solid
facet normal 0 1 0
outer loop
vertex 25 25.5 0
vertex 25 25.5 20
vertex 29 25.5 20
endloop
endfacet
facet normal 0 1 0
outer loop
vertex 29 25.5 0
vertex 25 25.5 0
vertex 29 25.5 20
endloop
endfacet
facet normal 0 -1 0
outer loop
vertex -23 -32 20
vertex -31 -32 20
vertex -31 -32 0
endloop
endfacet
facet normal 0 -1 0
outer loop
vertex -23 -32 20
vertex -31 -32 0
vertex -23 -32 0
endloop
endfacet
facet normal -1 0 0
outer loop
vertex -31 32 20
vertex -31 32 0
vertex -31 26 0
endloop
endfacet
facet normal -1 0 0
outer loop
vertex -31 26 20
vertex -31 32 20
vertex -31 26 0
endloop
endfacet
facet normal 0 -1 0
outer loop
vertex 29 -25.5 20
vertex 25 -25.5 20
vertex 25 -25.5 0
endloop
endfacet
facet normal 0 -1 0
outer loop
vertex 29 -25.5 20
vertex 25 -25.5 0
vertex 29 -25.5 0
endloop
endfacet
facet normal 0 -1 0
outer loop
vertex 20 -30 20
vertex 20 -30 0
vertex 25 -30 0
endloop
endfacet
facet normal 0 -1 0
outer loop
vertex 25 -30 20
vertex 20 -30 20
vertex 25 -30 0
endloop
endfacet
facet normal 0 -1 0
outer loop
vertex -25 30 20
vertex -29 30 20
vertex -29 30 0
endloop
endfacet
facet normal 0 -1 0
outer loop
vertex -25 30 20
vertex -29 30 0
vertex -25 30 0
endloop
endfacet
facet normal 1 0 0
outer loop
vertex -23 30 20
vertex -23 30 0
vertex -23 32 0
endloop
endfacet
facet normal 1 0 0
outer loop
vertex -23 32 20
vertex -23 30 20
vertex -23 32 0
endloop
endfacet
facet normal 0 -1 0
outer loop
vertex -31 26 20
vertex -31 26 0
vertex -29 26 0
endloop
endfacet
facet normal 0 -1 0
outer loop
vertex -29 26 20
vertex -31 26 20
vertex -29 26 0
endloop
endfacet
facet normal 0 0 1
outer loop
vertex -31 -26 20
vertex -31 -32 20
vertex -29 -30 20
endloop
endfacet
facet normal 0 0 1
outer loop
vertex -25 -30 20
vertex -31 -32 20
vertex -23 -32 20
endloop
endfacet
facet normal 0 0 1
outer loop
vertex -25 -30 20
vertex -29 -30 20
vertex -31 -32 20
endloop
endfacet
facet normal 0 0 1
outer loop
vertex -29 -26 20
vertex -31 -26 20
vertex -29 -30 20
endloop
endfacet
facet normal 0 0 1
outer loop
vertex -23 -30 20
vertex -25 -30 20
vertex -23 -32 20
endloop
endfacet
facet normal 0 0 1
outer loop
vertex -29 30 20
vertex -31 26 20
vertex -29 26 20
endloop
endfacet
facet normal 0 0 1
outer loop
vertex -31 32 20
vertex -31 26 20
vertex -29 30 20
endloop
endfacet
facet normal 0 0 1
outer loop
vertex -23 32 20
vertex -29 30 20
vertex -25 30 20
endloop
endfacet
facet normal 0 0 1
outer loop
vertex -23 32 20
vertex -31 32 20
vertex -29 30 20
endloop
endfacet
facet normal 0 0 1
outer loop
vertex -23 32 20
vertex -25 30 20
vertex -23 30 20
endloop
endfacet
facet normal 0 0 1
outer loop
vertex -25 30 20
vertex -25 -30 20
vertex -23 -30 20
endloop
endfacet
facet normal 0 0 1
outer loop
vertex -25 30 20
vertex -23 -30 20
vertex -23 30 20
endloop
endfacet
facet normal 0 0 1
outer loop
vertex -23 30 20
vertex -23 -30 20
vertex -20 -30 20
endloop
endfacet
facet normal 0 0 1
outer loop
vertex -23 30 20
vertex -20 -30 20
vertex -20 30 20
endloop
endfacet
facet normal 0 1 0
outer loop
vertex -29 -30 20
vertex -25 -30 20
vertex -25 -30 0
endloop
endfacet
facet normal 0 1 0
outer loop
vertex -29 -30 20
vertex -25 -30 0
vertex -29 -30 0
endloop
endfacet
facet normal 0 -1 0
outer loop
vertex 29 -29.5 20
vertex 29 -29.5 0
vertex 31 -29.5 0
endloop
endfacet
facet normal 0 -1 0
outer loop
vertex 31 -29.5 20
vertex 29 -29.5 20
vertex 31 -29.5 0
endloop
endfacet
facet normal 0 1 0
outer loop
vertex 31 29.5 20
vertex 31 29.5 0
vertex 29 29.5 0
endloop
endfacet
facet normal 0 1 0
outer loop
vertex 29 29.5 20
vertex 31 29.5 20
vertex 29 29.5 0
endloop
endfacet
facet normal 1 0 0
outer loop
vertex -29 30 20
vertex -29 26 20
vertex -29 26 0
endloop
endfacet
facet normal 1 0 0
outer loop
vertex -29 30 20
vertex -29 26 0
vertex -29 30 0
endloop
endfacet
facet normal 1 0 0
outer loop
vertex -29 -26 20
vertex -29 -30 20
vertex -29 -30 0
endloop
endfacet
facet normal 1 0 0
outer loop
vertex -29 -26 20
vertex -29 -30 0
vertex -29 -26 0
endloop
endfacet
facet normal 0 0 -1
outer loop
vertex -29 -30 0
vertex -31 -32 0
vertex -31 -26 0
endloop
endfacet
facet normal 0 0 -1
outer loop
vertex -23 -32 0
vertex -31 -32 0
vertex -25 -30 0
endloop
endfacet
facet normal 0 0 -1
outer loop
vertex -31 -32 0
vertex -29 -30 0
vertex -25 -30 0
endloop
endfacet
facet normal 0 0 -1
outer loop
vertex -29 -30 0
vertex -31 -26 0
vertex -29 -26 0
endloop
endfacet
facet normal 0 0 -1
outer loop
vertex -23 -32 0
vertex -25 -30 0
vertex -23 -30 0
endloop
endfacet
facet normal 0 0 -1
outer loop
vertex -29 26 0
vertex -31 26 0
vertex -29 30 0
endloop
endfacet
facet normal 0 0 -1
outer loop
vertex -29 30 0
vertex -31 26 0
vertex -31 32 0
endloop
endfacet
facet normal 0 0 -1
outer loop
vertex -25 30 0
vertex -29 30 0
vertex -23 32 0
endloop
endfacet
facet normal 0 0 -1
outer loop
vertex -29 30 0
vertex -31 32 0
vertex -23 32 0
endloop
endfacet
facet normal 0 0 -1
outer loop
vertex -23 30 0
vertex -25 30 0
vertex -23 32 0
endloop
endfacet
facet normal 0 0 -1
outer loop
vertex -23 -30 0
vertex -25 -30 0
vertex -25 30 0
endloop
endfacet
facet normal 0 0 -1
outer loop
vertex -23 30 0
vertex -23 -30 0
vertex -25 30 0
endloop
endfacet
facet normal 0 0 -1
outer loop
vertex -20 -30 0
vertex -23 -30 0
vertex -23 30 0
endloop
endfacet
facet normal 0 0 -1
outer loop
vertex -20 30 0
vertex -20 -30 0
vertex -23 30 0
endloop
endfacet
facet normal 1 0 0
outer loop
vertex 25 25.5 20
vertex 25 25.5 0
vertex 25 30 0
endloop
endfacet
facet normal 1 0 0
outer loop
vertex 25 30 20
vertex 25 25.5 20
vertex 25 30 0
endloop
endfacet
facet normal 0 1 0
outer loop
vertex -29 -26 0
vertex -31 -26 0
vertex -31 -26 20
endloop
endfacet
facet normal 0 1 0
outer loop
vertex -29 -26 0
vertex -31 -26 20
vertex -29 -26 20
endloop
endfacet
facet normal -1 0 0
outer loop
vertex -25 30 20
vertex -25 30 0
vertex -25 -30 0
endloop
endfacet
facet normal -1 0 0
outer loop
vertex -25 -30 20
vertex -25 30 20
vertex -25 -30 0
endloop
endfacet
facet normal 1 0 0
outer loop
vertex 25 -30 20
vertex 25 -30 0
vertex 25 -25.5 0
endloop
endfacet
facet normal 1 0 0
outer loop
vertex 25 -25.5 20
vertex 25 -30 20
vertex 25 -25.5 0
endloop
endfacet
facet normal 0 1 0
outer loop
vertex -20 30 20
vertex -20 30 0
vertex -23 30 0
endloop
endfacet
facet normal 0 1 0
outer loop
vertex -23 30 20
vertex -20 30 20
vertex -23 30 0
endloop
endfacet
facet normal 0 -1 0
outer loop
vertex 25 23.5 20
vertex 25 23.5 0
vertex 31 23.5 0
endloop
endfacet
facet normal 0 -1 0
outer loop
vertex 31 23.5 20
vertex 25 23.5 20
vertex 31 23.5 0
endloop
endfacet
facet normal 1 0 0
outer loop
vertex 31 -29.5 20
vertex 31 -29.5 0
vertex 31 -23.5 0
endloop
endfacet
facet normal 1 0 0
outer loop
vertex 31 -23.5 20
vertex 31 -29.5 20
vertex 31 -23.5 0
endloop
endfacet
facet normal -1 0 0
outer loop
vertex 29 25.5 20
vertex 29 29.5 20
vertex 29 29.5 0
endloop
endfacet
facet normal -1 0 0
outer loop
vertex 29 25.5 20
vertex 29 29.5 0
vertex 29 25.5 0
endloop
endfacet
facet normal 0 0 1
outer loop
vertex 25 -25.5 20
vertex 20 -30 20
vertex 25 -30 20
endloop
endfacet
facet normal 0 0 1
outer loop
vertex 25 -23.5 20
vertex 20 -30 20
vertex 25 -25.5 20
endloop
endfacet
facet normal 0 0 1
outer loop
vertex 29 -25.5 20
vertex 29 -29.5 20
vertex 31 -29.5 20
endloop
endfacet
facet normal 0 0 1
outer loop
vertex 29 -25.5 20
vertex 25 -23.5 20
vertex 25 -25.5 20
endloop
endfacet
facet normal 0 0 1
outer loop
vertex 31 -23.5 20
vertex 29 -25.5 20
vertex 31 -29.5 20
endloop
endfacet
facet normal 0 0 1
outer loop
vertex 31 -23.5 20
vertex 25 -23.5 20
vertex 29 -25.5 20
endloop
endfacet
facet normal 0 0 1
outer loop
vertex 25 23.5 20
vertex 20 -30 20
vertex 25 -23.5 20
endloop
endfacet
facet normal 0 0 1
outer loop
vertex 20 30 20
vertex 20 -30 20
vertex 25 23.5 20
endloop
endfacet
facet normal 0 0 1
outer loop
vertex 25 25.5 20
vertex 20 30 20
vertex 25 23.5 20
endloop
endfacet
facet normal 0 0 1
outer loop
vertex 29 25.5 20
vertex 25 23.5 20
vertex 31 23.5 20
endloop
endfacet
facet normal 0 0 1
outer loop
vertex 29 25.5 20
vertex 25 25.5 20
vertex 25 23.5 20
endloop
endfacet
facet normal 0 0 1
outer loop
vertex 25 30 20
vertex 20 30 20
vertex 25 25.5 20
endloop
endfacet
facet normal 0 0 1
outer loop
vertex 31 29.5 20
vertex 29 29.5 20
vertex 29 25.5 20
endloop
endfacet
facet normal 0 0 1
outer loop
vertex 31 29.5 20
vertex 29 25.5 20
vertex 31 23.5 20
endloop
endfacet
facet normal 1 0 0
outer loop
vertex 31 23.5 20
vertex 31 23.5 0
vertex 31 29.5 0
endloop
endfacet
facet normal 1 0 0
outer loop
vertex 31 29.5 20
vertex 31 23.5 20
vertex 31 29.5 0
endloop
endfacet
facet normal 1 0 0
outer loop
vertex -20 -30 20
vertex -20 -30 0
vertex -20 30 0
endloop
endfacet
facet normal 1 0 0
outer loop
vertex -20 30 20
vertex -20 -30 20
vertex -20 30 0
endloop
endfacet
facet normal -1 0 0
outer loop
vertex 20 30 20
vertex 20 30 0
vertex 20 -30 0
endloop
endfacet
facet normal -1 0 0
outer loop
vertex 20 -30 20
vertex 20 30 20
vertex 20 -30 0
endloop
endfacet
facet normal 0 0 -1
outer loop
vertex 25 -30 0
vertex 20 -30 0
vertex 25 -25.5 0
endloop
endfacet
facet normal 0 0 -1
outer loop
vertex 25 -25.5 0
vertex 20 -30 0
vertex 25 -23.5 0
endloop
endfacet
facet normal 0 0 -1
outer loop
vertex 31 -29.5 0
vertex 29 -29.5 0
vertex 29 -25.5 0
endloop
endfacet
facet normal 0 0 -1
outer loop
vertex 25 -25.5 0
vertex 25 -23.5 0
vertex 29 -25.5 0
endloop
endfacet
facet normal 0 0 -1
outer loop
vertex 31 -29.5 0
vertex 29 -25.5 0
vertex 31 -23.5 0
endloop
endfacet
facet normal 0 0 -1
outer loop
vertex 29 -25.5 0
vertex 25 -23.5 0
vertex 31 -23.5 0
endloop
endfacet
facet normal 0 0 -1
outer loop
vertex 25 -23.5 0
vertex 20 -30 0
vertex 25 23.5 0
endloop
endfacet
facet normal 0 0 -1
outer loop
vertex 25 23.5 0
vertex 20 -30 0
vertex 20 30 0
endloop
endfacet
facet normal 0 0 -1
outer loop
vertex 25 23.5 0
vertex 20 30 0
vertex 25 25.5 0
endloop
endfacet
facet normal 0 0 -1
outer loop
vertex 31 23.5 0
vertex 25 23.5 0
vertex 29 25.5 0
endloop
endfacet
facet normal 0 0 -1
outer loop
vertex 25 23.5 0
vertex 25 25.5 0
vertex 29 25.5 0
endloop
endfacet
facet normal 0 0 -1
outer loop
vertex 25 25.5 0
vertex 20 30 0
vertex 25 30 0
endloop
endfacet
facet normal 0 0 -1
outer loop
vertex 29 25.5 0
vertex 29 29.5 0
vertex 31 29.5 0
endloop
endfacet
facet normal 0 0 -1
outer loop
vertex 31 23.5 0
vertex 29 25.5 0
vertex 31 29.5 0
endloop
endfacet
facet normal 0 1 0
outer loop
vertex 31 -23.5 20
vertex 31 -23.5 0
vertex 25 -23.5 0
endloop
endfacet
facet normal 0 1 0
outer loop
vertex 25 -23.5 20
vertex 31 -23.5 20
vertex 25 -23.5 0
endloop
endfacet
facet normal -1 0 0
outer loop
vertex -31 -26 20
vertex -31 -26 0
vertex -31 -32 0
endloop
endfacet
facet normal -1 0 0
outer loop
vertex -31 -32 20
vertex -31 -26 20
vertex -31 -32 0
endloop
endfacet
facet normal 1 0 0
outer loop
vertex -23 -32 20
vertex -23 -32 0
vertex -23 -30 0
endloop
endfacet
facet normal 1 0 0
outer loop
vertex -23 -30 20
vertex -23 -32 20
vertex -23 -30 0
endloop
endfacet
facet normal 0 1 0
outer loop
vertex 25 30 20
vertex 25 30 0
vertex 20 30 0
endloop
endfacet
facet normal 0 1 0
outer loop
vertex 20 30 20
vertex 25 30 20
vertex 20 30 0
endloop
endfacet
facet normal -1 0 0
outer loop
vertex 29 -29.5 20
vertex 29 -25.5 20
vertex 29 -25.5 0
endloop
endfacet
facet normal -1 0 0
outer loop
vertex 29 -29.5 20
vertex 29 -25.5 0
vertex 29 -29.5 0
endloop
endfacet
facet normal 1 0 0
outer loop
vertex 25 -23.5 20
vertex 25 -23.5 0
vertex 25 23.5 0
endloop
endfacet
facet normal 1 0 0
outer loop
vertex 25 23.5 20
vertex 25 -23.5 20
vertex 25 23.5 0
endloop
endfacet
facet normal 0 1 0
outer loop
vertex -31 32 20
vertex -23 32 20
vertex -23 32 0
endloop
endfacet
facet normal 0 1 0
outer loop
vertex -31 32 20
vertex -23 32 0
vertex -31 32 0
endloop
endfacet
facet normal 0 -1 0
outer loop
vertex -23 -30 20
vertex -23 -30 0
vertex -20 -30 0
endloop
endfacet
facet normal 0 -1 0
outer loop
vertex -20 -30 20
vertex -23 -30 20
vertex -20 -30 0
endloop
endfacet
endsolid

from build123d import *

# Parameters (mm, degrees)
F0_W     = 5
F0_H     = 47
F0_W_2   = 2
F0_H_2   = 4
F0_H_3   = 2
F1_DEPTH = 20
F0_W_3   = 4


with BuildPart() as f1:
    # F0 (on Top) → F1 (new body)
    with BuildSketch(Plane.XY):
        Polygon((-29, 30), (-25, 30), (-23, 30), (-23, 32), (-29, 32), align=None)
        Polygon((-23, 30), (-25, 30), (-25, 23.5), (-20, 23.5), (-20, 30), align=None)
        with Locations((-22.5, 0)):
            Rectangle(F0_W, F0_H)
        with Locations((-30, 28)):
            Rectangle(F0_W_2, F0_H_2)
        with Locations((-30, 31)):
            Rectangle(F0_W_2, F0_H_3)
        Polygon((-20, -23.5), (-25, -23.5), (-25, -30), (-23, -30), (-20, -30), align=None)
        Polygon((-23, -30), (-25, -30), (-29, -30), (-29, -32), (-23, -32), align=None)
        with Locations((-30, -31)):
            Rectangle(F0_W_2, F0_H_3)
        with Locations((-30, -28)):
            Rectangle(F0_W_2, F0_H_2)
    extrude(amount=F1_DEPTH)


with BuildPart() as f1b:
    # F0 (on Top) → F1, piece 2 (new body)
    with BuildSketch(Plane.XY):
        Polygon((25, 30), (20, 30), (20, 23.5), (25, 23.5), (25, 25.5), align=None)
        with Locations((22.5, 0)):
            Rectangle(F0_W, F0_H)
        Polygon((25, -23.5), (20, -23.5), (20, -30), (25, -30), (25, -25.5), align=None)
        with Locations((27, 24.5)):
            Rectangle(F0_W_3, F0_H_3)
        with Locations((27, -24.5)):
            Rectangle(F0_W_3, F0_H_3)
        Polygon((29, 25.5), (29, 23.5), (31, 23.5), (31, 29.5), (29, 29.5), align=None)
        Polygon((31, -23.5), (29, -23.5), (29, -25.5), (29, -29.5), (31, -29.5), align=None)
    extrude(amount=F1_DEPTH)


solid = Compound([f1.part, f1b.part])
